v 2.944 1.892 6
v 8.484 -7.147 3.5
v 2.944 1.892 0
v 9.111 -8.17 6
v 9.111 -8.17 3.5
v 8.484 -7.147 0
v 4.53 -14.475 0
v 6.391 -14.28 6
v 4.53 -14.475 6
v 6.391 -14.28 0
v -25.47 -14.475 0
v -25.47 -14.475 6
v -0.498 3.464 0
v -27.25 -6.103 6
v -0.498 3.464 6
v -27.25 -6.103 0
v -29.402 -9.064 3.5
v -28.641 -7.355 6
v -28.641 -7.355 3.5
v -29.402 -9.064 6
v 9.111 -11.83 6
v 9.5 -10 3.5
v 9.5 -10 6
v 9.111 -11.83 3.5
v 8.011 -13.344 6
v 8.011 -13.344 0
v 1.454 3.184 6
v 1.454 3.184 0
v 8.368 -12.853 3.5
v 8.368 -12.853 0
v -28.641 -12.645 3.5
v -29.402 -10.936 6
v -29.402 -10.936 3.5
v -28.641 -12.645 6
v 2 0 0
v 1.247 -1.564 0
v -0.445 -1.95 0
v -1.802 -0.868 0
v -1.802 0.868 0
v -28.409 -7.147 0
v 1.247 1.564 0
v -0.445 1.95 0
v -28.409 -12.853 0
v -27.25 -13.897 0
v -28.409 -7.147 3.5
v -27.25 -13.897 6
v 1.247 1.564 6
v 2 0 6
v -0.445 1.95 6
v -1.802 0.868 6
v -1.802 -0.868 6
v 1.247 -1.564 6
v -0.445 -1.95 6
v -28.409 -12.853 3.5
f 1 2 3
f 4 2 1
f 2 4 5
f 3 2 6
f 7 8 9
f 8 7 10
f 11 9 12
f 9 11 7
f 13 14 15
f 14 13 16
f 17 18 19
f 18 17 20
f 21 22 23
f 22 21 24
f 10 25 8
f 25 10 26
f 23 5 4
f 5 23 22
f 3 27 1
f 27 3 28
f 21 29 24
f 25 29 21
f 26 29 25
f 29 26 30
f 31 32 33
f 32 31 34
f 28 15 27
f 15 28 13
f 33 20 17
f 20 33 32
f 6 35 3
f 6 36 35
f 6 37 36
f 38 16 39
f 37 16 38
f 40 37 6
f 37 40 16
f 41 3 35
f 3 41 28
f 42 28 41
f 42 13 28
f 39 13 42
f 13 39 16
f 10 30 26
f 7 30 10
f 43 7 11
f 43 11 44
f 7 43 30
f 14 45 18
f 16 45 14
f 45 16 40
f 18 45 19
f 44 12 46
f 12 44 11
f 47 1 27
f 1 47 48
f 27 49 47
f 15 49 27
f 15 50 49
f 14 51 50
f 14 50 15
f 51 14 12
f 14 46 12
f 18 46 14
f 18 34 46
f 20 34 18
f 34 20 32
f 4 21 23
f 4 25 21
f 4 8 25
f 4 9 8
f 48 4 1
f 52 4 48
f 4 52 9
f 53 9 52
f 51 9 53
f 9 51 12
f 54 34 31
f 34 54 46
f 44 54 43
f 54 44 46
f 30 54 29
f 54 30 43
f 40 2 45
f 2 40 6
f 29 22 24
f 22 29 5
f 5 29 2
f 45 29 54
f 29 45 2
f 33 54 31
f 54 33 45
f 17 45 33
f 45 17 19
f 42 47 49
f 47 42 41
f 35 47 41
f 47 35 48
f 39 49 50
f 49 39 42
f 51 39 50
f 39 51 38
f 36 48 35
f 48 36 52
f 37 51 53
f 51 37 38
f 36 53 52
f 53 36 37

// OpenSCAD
// file: config.scad
e = 0.01;

// Real Sterilite Tote Size
//toteHeight = 125;
//toteTopWidth = 200;
//toteBottomWidth = 155;
//toteTopLength = 355;
//toteBottomLength = 300;

// Scaled Size
toteHeight = 30;
toteTopWidth = 60;
toteBottomWidth = 45;
toteTopLength = 105;
toteBottomLength = 90;

// Parameters
fingerHeight = 5;
fingerClearance = 5;

armatureHeight = 10;
armatureThickness = 20;

baseHeight = 20;
baseThickness = 10;

boltDiameter = 3;
pinDiameter = 4;

base2Height = 20;

totesPerRow = 3;
// main file
include <config.scad>;

module armSlide() {
  translate([0, -5 - armatureHeight/2, 0])
    difference() {
      hull() {
        translate([-25, 0, 0])
          cylinder(d = armatureHeight - 1, h = 6);
        translate([5, 0, 0])
          cylinder(d = armatureHeight - 1, h = 6);
        translate([0, 5 + armatureHeight/2, 0])
          cylinder(d = 7, h = 6);
      }

      hull() {
        translate([-(25 + 5), 0, -e])
          cylinder(d = 6, h = 3.5 + e);
        translate([5 + 5, 0, -e])
          cylinder(d = 6, h = 3.5 + e);
      }
      translate([0, 5 + armatureHeight/2, -e])
        cylinder(d = 4, h = 6 + 2*e);
    }
}

armSlide();
